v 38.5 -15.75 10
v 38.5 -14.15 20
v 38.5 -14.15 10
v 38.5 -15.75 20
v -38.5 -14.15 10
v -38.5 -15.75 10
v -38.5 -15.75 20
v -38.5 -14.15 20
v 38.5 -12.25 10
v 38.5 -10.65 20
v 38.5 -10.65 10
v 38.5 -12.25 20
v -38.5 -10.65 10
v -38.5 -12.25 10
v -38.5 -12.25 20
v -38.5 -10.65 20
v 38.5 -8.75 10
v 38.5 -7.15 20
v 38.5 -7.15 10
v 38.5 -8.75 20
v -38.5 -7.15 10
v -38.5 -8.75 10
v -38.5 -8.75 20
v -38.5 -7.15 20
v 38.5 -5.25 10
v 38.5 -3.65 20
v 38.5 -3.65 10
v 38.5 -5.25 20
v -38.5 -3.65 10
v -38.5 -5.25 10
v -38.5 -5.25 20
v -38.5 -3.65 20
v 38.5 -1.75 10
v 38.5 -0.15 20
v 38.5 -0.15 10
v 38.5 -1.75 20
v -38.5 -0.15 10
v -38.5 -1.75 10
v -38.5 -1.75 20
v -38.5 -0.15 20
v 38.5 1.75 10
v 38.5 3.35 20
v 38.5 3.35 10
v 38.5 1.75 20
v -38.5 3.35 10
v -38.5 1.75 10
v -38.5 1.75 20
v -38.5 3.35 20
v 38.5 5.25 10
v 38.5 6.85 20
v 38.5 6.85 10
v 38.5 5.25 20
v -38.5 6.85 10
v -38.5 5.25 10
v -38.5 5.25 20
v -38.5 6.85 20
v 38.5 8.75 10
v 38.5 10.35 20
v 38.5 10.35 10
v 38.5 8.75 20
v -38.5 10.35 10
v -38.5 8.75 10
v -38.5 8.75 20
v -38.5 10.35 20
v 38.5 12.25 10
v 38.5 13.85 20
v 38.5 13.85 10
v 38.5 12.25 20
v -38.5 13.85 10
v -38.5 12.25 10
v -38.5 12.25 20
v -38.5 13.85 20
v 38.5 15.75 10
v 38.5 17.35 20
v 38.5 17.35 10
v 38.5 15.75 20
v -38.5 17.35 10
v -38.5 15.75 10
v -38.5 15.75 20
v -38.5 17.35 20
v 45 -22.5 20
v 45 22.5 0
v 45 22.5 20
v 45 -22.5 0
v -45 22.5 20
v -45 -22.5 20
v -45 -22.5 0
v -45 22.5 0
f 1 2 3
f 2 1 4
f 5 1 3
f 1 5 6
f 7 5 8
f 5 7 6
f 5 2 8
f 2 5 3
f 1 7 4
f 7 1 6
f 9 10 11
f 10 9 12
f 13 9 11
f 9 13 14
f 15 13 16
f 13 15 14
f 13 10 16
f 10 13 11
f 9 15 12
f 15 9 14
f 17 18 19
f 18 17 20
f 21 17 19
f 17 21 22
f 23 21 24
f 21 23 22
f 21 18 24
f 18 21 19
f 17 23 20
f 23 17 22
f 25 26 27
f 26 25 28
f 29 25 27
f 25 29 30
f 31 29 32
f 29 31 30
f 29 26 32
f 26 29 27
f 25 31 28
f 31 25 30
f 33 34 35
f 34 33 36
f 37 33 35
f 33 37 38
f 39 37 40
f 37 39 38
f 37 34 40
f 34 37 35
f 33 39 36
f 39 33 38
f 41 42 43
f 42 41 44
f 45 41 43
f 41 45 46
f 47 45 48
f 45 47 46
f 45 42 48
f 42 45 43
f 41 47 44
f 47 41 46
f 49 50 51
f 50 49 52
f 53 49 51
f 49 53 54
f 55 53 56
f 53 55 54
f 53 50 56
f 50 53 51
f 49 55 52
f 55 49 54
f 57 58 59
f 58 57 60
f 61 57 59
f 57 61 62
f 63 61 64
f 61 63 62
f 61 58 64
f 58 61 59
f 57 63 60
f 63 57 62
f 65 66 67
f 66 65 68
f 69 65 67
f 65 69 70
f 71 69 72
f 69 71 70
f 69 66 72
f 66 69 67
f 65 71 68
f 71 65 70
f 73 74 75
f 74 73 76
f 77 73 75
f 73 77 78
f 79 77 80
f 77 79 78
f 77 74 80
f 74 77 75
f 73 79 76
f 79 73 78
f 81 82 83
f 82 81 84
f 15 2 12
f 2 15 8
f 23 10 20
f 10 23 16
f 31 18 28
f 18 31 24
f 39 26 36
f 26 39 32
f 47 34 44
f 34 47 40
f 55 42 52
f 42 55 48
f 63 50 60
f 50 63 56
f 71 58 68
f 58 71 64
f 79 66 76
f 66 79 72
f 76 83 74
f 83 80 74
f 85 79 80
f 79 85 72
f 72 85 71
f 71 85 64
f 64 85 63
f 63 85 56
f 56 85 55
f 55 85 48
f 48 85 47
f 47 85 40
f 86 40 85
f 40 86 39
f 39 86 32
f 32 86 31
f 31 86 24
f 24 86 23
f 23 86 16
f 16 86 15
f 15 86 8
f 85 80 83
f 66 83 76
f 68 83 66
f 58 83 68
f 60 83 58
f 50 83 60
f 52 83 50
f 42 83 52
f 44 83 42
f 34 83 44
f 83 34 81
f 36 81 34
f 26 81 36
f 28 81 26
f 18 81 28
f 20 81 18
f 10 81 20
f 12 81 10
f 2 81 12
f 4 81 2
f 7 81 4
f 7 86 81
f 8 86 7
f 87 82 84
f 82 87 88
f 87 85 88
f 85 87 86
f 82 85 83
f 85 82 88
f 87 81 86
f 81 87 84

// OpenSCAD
// Microscope slide drying rack
// Print orientation: base block on XY plane, slots open upward (+Z)

// ---------- Parameters ----------
block_len      = 90;    // block length along X (mm)
block_wid      = 45;    // block width along Y (mm)
block_ht       = 20;    // block height along Z (mm)

slot_count     = 10;    // number of slide slots
slot_len       = 77;    // slot length along X (mm)
slot_wid       = 1.6;   // slot width along Y (mm)
slot_depth     = 10;    // slot depth from top face (mm)
slot_pitch     = 3.5;   // centre-to-centre slot spacing in Y (mm)

eps            = 0.5;   // overcut past faces to avoid coplanar surfaces (mm)

$fn = 64;

// ---------- Derived ----------
slot_x0 = -slot_len / 2;              // first slot start in X
slot_y0 = -(slot_count - 1) * slot_pitch / 2;  // first slot centre in Y (group centred)

// ---------- Model ----------
difference() {
    // Solid base block
    translate([-block_len / 2, -block_wid / 2, 0])
        cube([block_len, block_wid, block_ht]);

    // Parallel slots, open at the top
    for (i = [0 : slot_count - 1]) {
        translate([slot_x0, slot_y0 + i * slot_pitch, block_ht - slot_depth])
            cube([slot_len, slot_wid, slot_depth + eps]);
    }
}
